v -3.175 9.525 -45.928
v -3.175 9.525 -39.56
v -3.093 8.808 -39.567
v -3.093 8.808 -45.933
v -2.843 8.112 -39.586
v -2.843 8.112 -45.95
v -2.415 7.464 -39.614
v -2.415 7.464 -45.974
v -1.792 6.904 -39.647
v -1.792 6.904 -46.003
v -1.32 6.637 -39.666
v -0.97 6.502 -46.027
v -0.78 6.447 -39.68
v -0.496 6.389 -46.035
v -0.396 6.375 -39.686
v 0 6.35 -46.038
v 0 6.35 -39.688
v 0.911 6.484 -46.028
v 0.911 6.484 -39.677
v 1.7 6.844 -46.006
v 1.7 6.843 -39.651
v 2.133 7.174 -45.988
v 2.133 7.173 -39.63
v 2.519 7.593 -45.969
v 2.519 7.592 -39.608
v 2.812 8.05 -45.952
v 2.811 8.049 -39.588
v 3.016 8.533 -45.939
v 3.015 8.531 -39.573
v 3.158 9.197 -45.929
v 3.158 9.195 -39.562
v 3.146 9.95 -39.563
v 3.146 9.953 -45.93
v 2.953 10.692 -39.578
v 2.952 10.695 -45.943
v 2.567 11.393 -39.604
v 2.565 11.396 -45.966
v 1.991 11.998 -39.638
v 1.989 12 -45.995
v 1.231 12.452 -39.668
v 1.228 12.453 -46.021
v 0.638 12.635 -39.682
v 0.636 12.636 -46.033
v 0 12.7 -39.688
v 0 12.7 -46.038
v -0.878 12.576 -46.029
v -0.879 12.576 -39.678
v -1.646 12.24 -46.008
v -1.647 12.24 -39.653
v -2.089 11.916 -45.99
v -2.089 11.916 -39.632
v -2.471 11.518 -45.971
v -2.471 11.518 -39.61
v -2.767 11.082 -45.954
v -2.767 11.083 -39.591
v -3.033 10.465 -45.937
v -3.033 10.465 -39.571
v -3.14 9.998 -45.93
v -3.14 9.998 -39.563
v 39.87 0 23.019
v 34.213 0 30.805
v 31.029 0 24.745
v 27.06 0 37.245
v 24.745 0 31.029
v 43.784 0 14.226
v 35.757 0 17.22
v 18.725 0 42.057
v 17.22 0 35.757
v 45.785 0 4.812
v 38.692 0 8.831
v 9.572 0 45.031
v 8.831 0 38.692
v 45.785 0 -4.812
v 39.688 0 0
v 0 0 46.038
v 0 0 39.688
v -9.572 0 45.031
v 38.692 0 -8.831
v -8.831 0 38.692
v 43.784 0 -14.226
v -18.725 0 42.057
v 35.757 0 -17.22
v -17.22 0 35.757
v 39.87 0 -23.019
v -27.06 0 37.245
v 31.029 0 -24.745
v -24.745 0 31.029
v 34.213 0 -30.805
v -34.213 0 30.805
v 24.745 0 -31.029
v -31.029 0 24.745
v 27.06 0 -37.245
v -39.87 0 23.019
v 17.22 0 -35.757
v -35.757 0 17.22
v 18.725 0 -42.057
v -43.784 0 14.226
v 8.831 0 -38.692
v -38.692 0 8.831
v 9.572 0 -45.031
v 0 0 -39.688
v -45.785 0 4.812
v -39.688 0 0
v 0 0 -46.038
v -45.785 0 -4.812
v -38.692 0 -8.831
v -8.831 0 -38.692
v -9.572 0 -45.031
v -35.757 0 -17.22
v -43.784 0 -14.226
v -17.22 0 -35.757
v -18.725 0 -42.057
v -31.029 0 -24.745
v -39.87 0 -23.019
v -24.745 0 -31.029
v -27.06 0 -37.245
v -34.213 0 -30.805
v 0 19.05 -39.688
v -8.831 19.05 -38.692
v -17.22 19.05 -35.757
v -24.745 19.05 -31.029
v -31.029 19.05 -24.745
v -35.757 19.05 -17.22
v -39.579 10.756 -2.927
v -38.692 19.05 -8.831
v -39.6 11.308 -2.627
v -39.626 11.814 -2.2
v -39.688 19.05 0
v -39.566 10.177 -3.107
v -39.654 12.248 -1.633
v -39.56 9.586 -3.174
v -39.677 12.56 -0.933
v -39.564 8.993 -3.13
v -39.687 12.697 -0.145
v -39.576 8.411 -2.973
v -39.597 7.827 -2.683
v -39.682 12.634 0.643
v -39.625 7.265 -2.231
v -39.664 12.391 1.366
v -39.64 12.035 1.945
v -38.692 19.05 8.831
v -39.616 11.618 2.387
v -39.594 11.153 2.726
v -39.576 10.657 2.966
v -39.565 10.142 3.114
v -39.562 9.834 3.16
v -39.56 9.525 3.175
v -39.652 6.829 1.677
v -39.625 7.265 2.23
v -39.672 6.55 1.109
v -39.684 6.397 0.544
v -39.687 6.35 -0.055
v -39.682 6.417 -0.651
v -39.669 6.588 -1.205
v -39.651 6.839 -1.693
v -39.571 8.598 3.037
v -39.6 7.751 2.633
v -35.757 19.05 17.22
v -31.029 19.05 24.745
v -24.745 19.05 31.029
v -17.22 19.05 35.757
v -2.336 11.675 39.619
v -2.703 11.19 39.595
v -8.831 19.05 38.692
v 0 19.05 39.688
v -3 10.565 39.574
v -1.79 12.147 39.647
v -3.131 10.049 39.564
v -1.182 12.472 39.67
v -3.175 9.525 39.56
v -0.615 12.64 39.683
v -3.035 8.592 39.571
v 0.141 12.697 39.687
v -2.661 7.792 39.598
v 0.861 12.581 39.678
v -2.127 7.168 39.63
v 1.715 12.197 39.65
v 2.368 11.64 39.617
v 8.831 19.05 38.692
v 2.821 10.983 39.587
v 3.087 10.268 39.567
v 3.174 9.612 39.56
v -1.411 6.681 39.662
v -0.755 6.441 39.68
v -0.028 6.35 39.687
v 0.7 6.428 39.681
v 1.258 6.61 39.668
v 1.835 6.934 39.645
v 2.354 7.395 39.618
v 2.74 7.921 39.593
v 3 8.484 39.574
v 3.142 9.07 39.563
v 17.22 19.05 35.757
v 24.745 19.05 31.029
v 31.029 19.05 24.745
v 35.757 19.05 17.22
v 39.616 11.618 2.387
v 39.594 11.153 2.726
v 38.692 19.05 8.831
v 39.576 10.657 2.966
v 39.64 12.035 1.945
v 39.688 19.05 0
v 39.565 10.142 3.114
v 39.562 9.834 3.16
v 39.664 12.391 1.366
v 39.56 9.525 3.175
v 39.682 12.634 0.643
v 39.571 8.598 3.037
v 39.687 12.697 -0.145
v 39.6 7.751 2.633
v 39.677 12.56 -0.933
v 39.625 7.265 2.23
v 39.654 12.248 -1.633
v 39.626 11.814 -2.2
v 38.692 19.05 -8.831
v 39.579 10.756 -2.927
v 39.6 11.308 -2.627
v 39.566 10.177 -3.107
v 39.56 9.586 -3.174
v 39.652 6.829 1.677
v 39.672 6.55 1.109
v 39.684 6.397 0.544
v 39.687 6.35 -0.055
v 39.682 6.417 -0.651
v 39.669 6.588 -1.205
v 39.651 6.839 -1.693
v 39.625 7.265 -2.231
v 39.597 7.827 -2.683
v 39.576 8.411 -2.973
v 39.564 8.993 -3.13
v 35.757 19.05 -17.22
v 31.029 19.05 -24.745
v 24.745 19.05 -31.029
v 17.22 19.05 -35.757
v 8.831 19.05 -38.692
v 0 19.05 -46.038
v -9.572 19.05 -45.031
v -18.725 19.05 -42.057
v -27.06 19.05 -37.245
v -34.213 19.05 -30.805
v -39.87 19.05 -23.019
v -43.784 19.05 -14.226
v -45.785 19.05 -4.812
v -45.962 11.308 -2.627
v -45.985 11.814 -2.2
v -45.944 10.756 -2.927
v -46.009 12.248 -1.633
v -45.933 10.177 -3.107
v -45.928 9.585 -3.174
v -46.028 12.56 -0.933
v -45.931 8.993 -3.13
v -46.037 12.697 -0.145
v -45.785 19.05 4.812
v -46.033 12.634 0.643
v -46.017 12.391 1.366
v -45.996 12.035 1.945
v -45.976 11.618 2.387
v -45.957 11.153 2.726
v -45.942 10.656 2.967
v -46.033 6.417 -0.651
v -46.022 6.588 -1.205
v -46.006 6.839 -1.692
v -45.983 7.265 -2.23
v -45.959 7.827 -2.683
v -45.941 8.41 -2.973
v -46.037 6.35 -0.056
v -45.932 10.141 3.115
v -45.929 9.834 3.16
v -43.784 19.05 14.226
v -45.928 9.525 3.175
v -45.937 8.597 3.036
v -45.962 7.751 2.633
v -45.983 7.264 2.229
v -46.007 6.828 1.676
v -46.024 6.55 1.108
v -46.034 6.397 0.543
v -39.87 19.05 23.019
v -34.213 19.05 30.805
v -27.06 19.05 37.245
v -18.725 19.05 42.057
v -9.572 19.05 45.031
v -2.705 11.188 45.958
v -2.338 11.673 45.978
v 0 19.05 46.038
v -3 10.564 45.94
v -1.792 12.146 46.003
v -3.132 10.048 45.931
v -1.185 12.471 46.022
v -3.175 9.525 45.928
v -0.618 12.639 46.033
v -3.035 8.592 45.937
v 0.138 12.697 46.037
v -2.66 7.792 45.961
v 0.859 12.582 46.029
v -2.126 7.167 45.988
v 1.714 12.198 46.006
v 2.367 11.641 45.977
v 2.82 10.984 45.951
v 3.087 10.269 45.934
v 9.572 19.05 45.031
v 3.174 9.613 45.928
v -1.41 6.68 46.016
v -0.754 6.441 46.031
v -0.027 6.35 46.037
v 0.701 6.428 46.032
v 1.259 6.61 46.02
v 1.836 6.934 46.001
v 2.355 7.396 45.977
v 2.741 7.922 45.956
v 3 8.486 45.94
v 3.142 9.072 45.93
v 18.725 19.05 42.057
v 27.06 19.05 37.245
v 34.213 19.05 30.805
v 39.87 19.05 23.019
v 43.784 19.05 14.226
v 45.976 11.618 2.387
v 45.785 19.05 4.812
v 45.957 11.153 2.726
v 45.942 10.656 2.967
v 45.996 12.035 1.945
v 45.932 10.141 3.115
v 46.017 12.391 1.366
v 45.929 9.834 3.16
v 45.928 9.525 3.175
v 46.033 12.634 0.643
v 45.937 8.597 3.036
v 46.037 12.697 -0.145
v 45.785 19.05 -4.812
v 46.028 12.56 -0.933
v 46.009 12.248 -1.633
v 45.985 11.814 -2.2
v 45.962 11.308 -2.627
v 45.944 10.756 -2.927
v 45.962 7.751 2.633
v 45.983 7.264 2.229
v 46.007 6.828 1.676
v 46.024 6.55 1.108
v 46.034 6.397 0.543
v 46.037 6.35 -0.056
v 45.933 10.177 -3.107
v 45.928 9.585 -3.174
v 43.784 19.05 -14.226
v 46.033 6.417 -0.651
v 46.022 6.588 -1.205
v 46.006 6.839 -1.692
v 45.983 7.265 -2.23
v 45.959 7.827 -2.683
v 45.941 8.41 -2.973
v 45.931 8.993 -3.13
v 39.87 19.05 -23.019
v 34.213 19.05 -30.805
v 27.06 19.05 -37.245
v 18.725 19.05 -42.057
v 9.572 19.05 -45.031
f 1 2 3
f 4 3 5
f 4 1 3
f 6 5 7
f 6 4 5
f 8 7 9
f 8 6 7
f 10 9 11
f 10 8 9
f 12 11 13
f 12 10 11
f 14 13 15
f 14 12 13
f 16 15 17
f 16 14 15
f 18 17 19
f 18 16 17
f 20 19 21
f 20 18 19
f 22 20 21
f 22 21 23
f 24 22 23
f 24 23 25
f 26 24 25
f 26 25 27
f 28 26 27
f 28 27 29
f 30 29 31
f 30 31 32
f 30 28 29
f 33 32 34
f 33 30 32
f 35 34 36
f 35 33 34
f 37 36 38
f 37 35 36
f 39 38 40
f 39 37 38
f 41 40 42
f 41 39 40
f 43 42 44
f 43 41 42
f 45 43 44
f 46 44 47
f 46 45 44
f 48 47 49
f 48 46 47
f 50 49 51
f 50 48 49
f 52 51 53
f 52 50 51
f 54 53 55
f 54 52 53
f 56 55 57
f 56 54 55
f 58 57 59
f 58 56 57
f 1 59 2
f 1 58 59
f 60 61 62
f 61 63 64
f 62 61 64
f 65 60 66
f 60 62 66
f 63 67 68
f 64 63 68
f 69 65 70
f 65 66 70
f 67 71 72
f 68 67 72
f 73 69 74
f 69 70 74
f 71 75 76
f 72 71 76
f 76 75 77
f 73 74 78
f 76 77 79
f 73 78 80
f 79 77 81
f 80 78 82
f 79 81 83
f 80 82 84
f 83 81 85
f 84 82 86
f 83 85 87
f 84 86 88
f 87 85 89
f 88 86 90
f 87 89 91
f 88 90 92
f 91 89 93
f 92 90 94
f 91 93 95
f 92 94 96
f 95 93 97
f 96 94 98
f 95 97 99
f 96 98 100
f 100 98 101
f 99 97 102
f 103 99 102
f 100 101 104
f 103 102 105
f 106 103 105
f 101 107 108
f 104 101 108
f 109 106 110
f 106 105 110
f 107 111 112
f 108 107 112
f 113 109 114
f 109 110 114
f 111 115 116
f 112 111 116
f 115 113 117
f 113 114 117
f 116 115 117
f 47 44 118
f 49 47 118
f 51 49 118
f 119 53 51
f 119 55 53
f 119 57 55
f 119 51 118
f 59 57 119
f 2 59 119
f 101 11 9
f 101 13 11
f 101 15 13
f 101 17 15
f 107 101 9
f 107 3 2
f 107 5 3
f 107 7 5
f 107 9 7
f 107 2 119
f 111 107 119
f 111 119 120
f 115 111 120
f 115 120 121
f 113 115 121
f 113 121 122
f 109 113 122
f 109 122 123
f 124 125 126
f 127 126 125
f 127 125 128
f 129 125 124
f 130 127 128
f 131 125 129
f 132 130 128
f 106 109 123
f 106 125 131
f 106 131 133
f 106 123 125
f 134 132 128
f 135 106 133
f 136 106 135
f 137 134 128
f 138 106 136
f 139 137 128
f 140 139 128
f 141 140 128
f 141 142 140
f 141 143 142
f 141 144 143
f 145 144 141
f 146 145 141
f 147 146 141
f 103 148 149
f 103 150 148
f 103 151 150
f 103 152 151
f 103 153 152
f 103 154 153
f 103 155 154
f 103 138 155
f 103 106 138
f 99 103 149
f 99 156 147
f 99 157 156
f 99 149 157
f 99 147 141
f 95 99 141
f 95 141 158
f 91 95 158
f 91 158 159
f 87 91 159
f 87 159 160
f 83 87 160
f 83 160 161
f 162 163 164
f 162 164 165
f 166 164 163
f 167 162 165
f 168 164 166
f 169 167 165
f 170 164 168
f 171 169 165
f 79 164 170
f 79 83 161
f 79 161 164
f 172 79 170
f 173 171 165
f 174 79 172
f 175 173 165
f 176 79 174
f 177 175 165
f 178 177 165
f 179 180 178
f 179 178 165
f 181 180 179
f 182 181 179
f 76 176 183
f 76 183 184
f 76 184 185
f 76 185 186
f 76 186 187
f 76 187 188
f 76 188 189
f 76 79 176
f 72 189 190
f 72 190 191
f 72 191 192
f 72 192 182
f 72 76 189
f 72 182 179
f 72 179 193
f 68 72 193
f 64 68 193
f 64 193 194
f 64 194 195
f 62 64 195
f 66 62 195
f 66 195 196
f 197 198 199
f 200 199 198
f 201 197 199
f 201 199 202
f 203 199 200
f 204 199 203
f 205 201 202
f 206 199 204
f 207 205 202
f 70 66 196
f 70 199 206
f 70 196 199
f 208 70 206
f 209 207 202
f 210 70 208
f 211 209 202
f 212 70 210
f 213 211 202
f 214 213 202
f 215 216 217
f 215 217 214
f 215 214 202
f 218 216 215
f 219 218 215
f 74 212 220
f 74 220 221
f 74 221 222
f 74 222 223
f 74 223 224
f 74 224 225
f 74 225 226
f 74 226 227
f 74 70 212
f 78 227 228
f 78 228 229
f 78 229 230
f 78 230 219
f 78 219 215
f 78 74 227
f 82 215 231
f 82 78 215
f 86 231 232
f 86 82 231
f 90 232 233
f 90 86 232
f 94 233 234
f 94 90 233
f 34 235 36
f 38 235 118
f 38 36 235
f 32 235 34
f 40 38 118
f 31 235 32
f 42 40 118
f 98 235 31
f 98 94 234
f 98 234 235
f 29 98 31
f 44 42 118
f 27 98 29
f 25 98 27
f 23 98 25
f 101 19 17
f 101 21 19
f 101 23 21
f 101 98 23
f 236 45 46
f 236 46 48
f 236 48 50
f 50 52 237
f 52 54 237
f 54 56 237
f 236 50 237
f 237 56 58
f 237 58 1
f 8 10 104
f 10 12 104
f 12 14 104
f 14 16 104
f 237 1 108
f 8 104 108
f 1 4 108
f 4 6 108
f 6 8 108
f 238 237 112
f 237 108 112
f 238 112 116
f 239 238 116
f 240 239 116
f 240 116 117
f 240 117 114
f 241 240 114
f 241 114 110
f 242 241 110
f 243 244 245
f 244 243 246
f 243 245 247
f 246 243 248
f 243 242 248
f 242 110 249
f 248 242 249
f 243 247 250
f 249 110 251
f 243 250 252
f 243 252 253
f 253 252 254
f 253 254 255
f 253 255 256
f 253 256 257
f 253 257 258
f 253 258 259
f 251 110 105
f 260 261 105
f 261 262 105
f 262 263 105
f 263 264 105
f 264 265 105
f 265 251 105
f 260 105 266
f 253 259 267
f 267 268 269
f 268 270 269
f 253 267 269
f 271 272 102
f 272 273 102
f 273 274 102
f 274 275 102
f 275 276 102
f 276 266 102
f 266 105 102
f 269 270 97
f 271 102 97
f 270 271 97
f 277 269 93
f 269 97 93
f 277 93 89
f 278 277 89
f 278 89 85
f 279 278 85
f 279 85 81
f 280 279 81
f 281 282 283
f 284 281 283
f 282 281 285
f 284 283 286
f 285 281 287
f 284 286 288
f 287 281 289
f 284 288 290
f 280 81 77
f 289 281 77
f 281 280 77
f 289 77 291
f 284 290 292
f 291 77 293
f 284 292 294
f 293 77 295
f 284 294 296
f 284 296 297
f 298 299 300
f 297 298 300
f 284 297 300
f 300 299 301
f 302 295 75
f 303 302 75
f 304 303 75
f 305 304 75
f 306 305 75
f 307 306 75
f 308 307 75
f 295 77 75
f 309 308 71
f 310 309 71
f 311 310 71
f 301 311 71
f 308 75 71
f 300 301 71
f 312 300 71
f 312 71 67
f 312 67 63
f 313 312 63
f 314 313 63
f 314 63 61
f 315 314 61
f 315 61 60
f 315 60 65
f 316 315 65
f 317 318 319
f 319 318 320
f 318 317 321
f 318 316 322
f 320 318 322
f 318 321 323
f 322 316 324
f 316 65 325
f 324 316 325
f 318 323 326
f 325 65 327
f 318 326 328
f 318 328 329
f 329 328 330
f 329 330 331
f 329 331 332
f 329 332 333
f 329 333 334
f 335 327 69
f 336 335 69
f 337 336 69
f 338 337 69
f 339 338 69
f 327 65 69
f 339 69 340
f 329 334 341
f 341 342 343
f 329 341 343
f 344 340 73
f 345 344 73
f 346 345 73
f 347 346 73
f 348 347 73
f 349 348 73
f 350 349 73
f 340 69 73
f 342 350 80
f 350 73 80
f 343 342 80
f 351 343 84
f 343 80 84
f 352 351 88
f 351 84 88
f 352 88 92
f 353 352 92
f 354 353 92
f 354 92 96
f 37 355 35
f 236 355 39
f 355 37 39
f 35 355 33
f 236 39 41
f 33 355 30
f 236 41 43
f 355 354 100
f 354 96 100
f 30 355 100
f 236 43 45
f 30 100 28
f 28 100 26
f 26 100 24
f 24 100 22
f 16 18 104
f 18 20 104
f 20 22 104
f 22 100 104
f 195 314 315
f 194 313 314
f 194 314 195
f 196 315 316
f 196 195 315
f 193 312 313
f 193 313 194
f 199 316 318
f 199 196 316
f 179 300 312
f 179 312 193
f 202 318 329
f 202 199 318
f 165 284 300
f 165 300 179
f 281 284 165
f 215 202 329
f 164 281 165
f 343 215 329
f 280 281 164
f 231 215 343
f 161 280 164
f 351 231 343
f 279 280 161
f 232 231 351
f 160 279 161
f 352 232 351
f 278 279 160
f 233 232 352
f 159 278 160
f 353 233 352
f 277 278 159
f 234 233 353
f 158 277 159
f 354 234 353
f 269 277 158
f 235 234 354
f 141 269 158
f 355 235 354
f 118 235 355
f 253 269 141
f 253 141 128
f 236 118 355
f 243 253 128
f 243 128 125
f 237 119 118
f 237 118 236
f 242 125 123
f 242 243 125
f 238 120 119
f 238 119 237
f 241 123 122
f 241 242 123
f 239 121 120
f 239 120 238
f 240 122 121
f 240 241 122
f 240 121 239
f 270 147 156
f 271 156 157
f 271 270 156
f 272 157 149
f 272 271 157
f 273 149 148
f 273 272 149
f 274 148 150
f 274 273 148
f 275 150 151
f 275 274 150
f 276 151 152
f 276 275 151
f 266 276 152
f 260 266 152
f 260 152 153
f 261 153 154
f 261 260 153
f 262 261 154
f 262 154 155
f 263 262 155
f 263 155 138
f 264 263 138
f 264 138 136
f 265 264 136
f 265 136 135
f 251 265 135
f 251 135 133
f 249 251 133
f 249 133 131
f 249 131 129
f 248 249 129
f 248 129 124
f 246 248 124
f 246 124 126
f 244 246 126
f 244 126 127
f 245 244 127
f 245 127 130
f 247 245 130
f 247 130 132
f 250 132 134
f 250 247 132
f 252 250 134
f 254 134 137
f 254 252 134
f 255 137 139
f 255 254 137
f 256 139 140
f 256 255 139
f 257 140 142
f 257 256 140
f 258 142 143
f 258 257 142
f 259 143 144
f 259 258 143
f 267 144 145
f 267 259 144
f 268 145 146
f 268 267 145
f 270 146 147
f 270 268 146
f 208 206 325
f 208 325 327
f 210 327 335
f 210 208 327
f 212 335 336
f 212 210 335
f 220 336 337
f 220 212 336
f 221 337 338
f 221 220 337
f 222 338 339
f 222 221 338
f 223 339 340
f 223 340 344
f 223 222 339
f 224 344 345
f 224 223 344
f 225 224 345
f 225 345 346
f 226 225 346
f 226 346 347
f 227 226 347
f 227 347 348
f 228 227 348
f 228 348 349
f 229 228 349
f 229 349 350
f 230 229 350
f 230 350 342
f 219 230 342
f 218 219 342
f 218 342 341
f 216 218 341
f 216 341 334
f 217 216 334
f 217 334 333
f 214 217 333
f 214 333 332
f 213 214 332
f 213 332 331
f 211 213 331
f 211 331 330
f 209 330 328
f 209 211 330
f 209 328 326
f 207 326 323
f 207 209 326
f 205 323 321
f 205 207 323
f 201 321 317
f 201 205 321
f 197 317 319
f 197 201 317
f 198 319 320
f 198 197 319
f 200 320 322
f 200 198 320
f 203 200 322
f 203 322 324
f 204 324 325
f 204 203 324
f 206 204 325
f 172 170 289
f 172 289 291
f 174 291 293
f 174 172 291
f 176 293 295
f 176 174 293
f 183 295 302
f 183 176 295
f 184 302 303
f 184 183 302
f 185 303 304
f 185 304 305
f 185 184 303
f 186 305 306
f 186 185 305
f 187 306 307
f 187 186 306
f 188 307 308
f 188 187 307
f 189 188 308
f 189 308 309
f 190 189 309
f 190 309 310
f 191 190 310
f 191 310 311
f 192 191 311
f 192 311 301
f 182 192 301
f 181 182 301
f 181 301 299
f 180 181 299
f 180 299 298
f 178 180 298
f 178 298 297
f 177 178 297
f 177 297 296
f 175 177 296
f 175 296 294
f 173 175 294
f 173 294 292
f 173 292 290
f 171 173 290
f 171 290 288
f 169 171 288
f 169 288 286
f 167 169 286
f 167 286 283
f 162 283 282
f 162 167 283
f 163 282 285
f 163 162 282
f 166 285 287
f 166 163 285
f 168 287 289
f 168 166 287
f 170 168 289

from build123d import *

# Parameters (mm, degrees)
SKETCH1_R               = 46.0375
SKETCH1_R_2             = 39.6875
BOSS_EXTRUDE1_DEPTH     = 19.05
CUT_EXTRUDE4_DEPTH      = 76.2
CUT_EXTRUDE4_DEPTH_BACK = 76.2
SKETCH7_R               = 3.175
CUT_EXTRUDE5_DEPTH      = 76.2
CUT_EXTRUDE5_DEPTH_BACK = 76.2
SKETCH10_R              = 3.175


with BuildPart() as part:
    # Sketch1 → Boss-Extrude1 (new body)
    with BuildSketch(Plane(origin=(0, 0, 0), x_dir=(1, 0, 0), z_dir=(0, 1, 0))):
        Circle(SKETCH1_R)
        Circle(SKETCH1_R_2, mode=Mode.SUBTRACT)
    extrude(amount=BOSS_EXTRUDE1_DEPTH)

    # Sketch7 → Cut-Extrude4 (cut, two sides: drawn at the far end of the back side and taken through both)
    with BuildSketch(Plane.XY.offset(-CUT_EXTRUDE4_DEPTH_BACK)):
        with Locations((0, 9.525)):
            Circle(SKETCH7_R)
    extrude(amount=CUT_EXTRUDE4_DEPTH + CUT_EXTRUDE4_DEPTH_BACK, mode=Mode.SUBTRACT)

    # Sketch10 → Cut-Extrude5 (cut, two sides: drawn at the far end of the back side and taken through both)
    with BuildSketch(Plane(origin=(0, 0, 0), x_dir=(0, 0, -1), z_dir=(1, 0, 0)).offset(-CUT_EXTRUDE5_DEPTH_BACK)):
        with Locations((0, 9.525)):
            Circle(SKETCH10_R)
    extrude(amount=CUT_EXTRUDE5_DEPTH + CUT_EXTRUDE5_DEPTH_BACK, mode=Mode.SUBTRACT)


solid = part.part
